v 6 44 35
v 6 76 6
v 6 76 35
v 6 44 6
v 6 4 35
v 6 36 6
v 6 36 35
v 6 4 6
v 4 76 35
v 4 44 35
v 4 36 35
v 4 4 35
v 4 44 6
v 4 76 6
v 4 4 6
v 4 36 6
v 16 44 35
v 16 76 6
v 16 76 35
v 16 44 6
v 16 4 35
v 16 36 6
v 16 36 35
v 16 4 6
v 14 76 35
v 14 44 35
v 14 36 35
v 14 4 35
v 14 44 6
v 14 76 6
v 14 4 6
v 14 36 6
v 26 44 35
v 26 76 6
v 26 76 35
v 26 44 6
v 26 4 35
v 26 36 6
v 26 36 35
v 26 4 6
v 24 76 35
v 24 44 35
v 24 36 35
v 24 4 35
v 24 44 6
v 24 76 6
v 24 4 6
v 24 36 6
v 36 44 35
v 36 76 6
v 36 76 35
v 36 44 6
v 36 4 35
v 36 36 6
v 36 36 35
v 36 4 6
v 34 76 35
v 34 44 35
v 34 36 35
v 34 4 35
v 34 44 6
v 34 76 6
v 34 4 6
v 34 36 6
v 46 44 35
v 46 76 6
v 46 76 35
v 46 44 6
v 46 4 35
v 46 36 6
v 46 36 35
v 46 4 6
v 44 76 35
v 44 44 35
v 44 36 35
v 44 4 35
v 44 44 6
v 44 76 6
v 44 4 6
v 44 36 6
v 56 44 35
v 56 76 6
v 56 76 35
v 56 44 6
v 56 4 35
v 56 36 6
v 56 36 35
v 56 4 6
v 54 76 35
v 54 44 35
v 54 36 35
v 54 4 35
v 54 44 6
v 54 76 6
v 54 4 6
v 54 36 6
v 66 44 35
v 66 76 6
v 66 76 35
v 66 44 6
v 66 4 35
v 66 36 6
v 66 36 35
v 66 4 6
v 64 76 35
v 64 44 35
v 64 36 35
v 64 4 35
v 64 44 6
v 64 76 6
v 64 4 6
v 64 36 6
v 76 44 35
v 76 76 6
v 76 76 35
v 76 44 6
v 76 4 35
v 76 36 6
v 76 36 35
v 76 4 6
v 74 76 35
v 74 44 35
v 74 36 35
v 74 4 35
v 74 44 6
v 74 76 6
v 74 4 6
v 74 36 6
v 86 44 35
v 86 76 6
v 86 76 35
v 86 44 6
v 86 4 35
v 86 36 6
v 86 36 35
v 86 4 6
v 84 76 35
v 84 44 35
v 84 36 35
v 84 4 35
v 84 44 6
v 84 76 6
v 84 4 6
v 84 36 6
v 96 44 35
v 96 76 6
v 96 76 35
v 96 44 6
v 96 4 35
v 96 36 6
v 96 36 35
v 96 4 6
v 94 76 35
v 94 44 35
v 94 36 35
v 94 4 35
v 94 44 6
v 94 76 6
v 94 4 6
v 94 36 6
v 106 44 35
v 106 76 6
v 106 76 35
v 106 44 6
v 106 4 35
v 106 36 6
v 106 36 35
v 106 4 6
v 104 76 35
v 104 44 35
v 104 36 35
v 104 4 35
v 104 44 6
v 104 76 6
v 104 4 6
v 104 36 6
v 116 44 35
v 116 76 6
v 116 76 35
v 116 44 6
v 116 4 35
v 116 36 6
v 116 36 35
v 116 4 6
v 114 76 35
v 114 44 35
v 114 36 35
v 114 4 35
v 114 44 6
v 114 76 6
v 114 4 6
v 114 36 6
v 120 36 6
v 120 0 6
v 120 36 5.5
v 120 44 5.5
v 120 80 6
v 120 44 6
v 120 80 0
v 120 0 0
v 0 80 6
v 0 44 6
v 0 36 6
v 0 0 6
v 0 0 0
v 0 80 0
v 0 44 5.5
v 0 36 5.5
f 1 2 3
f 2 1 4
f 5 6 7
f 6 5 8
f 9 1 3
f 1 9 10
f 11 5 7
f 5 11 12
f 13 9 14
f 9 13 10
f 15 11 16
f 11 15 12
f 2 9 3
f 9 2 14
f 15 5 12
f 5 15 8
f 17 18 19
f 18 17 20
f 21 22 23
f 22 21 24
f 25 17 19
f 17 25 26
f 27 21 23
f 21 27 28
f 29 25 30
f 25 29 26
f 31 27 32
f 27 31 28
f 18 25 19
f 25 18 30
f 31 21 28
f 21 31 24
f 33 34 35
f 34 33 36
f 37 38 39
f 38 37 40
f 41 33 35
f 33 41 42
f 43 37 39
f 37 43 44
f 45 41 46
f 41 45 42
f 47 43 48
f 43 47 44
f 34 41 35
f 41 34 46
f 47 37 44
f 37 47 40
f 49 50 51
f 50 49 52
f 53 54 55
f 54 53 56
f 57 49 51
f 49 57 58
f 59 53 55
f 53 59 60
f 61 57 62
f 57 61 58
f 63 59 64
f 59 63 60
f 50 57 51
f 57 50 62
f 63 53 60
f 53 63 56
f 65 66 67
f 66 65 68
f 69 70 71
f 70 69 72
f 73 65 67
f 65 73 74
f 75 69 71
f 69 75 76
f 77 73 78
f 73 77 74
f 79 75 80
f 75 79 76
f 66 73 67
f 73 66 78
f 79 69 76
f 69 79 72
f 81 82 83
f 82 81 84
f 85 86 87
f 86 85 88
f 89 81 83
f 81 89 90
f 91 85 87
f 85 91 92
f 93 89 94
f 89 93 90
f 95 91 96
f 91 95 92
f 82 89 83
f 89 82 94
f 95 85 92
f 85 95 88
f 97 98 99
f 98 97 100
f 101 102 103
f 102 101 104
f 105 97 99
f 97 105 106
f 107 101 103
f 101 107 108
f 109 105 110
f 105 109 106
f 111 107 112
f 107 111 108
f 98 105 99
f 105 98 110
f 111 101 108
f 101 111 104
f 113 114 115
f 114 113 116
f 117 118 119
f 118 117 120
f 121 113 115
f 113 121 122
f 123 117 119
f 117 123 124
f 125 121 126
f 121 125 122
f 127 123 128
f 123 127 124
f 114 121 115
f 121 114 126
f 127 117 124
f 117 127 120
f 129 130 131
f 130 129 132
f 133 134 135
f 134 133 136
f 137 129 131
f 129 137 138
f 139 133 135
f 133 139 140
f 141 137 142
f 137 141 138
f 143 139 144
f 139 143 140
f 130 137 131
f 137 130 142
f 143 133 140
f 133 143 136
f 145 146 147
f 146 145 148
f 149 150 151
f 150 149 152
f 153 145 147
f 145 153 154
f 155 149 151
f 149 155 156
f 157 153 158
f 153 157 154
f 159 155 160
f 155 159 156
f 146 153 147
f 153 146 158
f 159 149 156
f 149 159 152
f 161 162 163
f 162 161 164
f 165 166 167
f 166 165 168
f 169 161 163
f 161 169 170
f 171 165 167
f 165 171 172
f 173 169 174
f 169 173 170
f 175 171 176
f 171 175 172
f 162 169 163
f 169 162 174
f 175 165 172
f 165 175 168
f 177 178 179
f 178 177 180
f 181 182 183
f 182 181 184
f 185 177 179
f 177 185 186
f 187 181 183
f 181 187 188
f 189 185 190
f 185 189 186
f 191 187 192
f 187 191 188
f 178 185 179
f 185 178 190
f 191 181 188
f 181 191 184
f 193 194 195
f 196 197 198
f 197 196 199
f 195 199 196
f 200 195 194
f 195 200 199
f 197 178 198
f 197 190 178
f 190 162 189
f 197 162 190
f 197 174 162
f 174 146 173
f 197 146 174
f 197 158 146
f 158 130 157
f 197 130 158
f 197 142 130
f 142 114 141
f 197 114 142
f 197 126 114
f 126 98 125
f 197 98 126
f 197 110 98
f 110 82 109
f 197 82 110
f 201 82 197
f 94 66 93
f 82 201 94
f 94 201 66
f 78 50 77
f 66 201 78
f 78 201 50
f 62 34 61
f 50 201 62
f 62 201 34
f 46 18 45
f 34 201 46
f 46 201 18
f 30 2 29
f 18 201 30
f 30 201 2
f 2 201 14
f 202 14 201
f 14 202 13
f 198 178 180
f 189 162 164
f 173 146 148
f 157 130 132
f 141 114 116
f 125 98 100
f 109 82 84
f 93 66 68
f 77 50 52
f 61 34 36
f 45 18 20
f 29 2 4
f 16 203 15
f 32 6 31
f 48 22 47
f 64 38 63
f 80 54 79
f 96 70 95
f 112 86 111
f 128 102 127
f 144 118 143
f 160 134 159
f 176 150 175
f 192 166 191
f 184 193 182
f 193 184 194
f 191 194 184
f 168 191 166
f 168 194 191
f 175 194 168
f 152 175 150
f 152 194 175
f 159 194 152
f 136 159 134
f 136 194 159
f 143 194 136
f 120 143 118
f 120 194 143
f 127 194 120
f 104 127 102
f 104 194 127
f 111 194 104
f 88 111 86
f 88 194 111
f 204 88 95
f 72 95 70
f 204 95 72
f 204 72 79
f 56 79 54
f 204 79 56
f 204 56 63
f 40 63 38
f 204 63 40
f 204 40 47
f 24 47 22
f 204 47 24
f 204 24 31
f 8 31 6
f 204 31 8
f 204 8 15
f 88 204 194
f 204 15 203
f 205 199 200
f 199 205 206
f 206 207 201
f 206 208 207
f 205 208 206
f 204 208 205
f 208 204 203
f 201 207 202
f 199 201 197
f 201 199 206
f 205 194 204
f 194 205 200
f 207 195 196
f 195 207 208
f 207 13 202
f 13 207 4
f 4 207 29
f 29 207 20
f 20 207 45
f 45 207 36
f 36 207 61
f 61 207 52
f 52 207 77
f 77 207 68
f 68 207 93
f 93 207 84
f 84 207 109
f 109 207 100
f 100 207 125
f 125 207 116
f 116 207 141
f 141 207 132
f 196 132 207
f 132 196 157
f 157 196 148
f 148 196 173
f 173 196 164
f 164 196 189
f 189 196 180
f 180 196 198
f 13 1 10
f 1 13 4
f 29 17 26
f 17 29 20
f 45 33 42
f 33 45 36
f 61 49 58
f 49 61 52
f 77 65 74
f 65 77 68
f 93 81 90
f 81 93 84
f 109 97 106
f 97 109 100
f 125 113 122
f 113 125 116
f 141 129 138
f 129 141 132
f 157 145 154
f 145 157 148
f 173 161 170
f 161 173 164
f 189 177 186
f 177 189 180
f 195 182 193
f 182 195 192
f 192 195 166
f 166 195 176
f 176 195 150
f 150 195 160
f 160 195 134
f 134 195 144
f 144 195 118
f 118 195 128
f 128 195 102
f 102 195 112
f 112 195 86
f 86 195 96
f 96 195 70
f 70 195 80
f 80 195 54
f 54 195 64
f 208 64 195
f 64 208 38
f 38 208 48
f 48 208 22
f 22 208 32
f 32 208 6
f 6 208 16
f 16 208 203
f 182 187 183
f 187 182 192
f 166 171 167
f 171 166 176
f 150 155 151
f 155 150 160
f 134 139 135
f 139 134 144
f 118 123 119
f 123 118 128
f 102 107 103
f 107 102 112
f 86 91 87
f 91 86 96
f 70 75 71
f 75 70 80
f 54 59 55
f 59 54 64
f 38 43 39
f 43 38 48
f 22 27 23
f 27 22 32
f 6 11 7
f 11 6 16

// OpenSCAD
$fn = 32;

// ----------------------------------------------------------------------
// Heatsink: slotted fin block
// ----------------------------------------------------------------------

// --- parameters (mm) ---
base_l = 120;             // base length, X
base_w = 80;              // base width, Y
base_t = 6;               // base plate thickness
fin_h = 30;               // fin height above the base
fin_t = 2;                // fin thickness
edge = 4;                 // margin from the base ends
pitch = 10;               // fin pitch
slot_w = 8;               // central slot width, Y

n_fins = floor((base_l - 2 * edge - fin_t) / pitch) + 1;  // fin count
total_h = base_t + fin_h - 1;  // overall height

difference() {
union() {
  cube([base_l, base_w, base_t]);
  for (i = [0 : n_fins - 1])
    translate([edge + i * pitch, edge, base_t - 1])
      cube([fin_t, base_w - 2 * edge, fin_h]);
}
  translate([-1, base_w / 2 - slot_w / 2, base_t - 0.5])
    cube([base_l + 2, slot_w, fin_h + 2]);
}
